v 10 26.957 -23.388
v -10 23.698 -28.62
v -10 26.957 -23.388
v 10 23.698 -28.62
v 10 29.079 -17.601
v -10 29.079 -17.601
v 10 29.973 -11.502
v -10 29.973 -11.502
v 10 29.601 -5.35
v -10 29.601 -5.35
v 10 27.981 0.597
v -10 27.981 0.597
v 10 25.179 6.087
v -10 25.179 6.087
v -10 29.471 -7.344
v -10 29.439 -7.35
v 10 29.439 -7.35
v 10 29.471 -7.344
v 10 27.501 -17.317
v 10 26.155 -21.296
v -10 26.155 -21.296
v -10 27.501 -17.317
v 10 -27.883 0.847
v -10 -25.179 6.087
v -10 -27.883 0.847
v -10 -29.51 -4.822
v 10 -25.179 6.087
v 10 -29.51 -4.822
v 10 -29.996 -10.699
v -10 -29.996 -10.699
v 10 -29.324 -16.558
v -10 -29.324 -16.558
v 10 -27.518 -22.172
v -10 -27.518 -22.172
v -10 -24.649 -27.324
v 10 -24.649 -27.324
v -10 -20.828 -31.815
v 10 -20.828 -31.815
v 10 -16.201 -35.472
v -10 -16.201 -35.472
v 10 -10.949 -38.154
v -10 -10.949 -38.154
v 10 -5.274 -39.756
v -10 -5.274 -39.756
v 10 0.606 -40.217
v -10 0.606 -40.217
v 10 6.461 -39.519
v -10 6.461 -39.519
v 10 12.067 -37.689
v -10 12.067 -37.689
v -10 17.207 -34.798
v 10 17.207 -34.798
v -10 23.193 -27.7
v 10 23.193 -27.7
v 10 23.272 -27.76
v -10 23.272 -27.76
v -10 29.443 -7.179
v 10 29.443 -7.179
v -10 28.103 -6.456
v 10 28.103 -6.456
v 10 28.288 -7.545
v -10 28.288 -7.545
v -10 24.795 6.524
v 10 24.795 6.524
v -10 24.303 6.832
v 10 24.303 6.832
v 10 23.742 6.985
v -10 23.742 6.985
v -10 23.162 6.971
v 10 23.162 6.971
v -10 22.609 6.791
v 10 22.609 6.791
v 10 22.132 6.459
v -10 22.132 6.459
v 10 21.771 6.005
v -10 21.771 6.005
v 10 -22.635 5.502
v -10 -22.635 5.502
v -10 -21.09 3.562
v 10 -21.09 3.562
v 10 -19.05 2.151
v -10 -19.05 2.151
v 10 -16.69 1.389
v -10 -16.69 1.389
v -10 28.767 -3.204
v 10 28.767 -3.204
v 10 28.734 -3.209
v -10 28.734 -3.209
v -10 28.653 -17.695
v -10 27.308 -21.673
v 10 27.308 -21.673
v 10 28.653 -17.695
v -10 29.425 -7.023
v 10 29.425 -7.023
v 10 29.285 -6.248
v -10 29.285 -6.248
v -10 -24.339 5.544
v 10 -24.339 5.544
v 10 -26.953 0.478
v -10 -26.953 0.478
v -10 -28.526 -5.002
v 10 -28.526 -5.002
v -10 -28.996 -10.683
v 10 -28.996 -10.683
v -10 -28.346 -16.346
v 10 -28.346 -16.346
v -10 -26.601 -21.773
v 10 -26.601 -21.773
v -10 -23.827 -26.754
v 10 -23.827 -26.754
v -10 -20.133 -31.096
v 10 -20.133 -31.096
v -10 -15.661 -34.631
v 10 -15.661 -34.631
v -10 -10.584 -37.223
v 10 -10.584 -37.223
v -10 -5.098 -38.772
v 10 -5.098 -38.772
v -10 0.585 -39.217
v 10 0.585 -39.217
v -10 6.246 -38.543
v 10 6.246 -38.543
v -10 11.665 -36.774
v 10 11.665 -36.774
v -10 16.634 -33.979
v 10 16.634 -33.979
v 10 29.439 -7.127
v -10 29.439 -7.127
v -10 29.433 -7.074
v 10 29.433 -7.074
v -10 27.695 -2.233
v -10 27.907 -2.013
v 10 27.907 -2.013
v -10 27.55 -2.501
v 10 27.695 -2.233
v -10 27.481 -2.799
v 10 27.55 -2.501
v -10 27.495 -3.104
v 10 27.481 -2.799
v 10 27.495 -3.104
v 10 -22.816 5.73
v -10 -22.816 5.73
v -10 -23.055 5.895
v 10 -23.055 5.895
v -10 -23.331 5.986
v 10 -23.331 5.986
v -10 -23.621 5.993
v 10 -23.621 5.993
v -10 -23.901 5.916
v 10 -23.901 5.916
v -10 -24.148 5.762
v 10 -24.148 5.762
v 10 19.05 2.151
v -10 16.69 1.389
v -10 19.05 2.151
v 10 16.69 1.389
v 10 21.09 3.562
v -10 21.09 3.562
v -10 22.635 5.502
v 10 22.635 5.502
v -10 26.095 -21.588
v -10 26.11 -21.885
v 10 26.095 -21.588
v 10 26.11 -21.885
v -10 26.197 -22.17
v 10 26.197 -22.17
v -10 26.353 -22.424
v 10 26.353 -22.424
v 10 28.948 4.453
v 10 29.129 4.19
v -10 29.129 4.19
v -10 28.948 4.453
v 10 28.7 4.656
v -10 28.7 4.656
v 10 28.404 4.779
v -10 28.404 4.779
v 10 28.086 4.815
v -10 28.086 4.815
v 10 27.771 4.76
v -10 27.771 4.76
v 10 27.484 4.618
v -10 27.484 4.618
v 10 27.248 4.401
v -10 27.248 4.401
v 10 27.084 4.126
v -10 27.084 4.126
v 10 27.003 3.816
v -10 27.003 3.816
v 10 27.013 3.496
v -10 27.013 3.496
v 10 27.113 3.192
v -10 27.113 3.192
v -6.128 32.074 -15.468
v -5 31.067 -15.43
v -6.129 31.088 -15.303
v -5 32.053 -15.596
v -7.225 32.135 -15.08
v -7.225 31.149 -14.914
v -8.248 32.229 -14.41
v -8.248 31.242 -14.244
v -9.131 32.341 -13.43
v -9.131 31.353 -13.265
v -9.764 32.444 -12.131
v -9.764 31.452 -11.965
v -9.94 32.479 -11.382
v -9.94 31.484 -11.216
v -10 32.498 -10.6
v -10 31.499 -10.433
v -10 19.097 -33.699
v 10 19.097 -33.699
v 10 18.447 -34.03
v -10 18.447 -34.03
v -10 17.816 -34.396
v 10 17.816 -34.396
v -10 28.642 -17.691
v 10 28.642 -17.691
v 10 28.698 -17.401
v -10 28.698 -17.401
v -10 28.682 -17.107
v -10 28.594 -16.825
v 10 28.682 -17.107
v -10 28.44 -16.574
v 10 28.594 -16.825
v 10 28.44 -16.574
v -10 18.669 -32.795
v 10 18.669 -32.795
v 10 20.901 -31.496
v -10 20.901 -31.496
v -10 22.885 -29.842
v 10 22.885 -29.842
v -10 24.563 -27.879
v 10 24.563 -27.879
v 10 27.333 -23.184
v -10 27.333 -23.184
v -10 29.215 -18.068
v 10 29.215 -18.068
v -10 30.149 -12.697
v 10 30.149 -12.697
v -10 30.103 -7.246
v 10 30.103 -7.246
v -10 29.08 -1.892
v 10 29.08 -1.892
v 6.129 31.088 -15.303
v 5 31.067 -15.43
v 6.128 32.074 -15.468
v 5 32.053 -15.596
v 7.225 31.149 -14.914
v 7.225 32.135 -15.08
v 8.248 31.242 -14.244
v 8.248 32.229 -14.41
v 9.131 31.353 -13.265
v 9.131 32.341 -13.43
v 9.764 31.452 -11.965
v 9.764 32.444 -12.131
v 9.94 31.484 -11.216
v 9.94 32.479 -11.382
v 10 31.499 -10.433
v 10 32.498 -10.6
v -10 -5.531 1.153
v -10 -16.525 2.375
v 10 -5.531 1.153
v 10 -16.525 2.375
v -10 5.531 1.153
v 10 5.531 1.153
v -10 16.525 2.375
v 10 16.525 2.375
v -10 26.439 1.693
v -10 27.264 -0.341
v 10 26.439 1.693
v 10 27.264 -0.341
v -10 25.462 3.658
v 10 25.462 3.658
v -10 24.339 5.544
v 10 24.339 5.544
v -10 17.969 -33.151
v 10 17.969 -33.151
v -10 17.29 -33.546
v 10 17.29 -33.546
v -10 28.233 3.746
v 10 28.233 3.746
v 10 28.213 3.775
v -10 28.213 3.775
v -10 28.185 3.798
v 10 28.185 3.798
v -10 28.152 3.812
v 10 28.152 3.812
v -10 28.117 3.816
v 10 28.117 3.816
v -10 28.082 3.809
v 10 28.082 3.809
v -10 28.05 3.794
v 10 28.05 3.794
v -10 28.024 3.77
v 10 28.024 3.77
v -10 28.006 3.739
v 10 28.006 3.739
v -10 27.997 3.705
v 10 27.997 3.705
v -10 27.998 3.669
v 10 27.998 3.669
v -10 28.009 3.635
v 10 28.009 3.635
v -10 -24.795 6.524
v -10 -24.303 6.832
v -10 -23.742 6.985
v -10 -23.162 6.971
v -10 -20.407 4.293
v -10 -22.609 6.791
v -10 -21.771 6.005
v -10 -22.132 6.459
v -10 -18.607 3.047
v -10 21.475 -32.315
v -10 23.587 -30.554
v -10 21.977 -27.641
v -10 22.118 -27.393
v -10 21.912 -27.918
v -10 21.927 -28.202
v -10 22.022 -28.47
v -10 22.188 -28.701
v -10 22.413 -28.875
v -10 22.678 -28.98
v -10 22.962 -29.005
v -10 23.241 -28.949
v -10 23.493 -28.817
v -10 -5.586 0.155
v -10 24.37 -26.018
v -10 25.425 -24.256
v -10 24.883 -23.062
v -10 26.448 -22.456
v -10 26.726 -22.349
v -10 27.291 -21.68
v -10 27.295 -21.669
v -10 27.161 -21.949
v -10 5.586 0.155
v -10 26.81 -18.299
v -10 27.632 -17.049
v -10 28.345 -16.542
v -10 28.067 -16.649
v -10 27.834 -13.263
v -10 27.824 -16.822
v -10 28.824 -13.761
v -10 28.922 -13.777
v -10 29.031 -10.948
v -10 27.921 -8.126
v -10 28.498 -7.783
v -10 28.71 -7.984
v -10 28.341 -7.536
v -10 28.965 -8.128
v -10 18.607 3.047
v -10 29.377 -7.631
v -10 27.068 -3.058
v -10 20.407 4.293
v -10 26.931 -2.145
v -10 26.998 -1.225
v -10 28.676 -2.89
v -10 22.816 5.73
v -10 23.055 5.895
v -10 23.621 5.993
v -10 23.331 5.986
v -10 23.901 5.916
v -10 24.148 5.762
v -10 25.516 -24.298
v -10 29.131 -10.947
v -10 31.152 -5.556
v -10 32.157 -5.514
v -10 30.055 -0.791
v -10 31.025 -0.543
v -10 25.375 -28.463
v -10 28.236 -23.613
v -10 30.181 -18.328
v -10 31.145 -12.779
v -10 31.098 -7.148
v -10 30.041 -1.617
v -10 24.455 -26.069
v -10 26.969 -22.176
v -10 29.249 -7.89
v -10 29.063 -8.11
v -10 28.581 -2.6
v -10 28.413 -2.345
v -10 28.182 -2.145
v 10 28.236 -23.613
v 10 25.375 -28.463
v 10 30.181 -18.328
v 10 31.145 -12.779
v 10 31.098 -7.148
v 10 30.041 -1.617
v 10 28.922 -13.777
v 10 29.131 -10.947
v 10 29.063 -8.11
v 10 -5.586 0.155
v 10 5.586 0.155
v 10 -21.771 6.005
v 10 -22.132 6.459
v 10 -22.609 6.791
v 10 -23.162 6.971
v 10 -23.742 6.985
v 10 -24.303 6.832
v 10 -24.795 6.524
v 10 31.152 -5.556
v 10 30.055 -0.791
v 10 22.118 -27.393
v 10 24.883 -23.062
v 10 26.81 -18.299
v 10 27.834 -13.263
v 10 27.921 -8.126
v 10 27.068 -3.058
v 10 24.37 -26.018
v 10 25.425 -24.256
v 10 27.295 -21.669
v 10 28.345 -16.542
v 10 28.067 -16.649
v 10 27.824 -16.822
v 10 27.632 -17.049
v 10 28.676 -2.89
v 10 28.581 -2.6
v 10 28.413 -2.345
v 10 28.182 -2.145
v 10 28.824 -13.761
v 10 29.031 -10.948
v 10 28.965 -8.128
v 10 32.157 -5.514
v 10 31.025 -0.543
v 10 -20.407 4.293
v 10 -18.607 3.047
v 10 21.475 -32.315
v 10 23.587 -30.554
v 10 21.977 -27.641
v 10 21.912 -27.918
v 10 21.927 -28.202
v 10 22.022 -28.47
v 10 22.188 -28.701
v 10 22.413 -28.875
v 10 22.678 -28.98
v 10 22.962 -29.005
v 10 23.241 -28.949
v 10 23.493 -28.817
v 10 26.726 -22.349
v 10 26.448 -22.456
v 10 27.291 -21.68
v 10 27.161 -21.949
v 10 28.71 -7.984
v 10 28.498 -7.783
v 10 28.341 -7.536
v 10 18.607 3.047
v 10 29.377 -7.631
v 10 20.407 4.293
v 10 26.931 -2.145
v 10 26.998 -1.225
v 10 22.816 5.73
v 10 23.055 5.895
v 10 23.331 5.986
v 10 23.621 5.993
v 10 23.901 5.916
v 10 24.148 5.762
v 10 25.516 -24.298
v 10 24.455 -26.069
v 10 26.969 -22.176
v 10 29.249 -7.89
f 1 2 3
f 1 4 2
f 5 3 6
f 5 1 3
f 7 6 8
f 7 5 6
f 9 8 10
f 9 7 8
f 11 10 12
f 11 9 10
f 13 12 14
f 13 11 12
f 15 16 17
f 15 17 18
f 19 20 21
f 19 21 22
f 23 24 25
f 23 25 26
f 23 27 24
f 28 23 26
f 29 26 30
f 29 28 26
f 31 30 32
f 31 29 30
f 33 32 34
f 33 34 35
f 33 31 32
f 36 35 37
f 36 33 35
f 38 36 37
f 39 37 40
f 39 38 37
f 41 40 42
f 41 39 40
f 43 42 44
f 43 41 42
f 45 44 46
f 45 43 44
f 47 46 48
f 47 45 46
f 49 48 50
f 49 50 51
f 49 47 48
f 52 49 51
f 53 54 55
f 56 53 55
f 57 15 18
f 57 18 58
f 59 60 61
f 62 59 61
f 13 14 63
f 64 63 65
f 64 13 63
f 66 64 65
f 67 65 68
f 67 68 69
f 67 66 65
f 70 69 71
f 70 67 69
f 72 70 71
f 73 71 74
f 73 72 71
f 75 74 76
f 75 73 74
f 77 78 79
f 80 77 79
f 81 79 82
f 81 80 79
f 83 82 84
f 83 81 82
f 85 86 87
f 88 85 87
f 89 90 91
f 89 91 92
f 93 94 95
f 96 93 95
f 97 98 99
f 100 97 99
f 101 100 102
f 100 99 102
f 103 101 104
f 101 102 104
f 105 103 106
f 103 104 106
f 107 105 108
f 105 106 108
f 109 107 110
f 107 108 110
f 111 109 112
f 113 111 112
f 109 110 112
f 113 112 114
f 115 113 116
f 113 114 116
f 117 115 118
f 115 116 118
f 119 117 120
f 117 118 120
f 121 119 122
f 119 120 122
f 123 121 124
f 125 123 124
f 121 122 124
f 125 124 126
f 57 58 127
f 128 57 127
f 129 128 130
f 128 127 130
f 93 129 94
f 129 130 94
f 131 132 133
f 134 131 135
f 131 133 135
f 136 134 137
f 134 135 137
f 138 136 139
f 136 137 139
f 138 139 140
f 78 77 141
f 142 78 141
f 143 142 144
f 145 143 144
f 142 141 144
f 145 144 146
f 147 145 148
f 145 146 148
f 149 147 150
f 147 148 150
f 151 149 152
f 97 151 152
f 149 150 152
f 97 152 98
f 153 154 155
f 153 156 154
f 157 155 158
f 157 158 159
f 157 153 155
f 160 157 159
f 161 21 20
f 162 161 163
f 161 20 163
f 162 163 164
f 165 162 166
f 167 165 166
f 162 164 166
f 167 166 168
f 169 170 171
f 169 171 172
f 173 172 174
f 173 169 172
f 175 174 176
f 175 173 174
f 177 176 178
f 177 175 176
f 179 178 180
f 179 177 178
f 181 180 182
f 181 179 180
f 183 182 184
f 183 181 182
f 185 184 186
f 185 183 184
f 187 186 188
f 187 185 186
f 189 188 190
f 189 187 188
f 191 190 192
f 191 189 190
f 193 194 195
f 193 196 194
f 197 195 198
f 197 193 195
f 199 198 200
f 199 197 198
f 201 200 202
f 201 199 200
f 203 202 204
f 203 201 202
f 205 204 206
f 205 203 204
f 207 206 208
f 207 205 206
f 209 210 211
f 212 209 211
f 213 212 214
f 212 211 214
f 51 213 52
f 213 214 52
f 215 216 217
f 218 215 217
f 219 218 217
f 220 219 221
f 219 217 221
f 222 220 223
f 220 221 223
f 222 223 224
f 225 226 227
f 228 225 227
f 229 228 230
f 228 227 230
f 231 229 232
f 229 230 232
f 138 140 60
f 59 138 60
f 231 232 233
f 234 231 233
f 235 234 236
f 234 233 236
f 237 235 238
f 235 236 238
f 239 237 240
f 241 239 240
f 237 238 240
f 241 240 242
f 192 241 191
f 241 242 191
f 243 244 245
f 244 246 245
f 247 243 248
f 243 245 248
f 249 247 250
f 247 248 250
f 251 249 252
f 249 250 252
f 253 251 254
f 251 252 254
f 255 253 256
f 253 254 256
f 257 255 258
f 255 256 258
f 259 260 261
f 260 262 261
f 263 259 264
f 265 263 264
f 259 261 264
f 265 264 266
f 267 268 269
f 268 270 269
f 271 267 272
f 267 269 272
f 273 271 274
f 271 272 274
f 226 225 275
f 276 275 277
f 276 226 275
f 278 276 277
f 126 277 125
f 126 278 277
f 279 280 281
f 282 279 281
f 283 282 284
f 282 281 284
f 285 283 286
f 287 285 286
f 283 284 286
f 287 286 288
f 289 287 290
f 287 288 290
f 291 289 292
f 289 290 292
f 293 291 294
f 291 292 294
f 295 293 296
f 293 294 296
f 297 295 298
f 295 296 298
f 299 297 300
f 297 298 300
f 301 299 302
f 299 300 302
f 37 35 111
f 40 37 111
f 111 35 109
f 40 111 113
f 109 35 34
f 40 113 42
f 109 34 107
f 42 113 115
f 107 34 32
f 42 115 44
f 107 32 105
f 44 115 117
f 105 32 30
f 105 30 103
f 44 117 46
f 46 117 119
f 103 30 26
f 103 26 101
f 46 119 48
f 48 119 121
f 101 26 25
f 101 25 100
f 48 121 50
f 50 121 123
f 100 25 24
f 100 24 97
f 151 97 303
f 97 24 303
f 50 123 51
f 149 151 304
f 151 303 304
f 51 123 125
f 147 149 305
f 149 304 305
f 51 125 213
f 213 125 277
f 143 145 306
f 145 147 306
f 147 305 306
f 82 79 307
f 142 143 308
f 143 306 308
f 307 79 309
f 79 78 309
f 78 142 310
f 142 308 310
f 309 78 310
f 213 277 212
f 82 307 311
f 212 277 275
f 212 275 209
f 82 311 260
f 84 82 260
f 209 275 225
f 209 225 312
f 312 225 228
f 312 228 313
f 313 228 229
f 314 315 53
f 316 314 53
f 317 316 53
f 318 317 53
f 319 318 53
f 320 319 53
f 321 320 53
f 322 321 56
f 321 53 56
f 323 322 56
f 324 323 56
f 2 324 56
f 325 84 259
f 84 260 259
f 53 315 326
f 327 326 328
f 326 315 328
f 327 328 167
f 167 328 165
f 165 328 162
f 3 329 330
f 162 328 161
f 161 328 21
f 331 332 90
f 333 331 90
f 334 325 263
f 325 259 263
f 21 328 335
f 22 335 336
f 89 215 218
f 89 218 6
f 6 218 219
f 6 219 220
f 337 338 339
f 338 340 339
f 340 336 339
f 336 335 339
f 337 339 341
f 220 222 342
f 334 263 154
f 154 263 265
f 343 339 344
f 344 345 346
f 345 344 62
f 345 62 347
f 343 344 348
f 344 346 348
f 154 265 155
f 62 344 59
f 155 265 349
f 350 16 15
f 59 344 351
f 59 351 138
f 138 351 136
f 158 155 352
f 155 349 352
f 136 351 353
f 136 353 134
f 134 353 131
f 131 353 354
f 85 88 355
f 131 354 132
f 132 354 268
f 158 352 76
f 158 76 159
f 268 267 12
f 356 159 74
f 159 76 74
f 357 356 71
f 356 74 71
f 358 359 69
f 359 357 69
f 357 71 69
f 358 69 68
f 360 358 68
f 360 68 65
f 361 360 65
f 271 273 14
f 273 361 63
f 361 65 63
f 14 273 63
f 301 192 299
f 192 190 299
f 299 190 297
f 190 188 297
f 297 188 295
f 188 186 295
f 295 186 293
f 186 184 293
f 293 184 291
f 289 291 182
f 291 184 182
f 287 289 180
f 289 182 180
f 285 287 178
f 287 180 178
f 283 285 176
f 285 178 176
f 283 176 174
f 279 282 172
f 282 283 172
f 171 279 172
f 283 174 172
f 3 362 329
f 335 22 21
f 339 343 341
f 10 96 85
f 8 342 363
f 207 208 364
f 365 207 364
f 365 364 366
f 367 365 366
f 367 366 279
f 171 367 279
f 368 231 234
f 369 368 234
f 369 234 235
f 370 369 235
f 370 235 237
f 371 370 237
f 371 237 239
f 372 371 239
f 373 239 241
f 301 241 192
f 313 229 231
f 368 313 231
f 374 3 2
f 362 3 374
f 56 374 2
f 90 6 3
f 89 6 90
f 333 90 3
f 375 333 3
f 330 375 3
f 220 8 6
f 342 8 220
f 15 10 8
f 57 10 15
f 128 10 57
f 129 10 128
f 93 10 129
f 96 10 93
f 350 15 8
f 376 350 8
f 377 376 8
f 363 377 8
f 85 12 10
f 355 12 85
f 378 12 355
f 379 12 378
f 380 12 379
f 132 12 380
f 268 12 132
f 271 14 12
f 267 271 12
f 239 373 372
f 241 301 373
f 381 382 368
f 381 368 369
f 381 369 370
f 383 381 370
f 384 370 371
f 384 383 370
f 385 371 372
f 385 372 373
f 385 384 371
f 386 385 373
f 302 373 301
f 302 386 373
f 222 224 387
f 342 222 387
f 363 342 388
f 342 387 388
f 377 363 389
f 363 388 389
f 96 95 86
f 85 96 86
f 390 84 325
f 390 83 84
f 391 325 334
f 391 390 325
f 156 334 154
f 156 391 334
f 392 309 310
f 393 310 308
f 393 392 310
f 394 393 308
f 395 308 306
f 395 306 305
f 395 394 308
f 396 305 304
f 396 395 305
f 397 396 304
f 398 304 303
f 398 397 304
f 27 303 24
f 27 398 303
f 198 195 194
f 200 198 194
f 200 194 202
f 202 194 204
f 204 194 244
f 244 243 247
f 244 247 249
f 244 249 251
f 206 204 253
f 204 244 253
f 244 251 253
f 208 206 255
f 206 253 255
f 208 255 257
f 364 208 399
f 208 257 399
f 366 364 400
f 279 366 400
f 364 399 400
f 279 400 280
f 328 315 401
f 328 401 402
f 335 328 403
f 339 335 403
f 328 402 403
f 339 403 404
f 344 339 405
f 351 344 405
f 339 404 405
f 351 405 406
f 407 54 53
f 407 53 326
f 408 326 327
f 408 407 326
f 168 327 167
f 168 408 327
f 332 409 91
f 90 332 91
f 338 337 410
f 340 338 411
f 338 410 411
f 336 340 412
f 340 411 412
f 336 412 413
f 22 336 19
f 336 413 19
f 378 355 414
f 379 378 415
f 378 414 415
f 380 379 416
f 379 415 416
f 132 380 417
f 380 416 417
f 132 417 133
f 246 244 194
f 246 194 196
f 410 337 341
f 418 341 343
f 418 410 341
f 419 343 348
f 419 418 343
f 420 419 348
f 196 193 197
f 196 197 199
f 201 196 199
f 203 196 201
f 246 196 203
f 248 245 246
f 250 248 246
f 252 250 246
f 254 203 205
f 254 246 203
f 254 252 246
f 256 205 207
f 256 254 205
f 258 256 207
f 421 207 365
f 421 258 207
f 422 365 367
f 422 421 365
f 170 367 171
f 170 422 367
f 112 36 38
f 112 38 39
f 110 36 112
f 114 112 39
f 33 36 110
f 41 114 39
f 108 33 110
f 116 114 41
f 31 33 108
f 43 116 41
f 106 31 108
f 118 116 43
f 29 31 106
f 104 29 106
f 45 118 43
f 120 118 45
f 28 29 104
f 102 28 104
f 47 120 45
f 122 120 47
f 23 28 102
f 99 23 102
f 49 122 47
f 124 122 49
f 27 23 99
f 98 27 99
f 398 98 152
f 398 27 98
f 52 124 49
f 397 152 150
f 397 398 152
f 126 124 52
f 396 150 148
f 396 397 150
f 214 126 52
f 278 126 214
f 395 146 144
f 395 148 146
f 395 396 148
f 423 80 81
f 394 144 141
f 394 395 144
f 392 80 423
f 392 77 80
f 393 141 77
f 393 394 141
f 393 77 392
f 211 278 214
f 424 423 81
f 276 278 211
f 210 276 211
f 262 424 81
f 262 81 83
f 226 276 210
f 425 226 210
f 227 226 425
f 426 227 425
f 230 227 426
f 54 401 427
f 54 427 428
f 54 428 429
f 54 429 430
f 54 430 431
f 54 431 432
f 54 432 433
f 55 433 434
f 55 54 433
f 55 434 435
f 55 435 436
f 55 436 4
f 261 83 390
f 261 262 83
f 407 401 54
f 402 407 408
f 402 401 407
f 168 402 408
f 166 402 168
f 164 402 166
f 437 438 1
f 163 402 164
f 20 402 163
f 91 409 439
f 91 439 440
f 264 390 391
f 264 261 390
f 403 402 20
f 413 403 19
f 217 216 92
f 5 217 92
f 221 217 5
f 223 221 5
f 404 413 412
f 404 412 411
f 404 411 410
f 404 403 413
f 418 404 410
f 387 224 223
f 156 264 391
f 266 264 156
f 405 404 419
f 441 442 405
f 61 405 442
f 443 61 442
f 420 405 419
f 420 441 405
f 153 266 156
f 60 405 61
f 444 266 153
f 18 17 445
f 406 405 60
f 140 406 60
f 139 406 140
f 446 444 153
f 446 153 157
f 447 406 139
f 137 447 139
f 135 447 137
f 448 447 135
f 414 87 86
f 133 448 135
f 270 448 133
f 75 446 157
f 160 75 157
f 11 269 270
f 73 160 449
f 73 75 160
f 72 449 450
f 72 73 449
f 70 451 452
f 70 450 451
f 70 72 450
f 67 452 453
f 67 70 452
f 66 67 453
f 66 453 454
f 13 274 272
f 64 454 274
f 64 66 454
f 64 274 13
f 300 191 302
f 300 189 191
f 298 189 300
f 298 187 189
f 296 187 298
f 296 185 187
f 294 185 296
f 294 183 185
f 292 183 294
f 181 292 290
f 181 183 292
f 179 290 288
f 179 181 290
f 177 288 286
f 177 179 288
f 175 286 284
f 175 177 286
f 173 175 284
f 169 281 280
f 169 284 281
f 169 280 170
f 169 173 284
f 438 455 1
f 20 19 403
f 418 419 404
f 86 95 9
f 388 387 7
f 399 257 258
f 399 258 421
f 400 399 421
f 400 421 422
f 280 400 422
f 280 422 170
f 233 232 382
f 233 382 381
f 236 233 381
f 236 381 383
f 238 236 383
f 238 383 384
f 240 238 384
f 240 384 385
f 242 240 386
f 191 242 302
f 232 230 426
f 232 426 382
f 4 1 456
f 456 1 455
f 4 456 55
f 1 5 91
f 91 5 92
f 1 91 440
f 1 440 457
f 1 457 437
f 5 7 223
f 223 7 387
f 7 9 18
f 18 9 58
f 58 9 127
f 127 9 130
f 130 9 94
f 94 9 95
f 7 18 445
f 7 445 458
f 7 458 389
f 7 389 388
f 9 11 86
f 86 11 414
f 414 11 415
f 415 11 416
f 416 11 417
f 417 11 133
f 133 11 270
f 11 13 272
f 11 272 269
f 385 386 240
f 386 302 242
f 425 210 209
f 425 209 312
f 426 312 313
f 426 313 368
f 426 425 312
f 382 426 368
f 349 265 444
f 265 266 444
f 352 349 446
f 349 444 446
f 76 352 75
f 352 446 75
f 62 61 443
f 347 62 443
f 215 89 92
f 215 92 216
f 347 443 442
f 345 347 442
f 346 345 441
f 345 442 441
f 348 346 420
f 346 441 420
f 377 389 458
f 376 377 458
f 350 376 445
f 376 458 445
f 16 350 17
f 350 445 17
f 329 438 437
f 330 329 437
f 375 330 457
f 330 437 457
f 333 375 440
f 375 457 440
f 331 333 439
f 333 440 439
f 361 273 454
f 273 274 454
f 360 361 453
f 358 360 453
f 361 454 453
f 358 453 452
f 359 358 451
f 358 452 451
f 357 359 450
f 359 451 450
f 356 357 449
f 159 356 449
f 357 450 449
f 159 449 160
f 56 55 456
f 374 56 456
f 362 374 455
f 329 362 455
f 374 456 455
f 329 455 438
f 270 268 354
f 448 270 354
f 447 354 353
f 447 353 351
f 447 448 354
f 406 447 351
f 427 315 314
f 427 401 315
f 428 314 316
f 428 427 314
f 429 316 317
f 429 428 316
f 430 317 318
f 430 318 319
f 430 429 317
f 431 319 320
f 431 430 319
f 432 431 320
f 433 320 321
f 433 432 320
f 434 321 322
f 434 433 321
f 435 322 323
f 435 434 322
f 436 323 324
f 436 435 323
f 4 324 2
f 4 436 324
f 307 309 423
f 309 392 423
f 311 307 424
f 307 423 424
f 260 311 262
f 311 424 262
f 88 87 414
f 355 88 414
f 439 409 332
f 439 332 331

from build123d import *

# Parameters (mm, degrees)
PAD_DEPTH            = 10
POCKET004_DEPTH      = 10.001
POCKET004_DEPTH_BACK = 10.001
FILLET_R             = 5


with BuildPart() as part:
    # Sketch031 → Pad (new body, symmetric)
    with BuildSketch(Plane.YZ):
        with BuildLine():
            ThreePointArc((-25.1785714286, 6.0873812391), (-20.8275502166, -31.8153069654), (17.2072930905, -34.7978986763))
            ThreePointArc((19.0972829456, -33.698609943), (18.1291736499, -34.2085141395), (17.2072930905, -34.7978986763))
            ThreePointArc((19.0972829456, -33.698609943), (22.5681914002, -31.4789887478), (25.3748102311, -28.4628961617))
            ThreePointArc((25.3748102311, -28.4628961617), (31.145297274, -12.7793024717), (28.0089705885, 3.6352364091))
            ThreePointArc((28.2330423532, 3.7461049992), (28.0655721758, 3.8027065865), (28.0089705885, 3.6352364091))
            ThreePointArc((31.066665528, -15.4302839547), (31.1616320501, -5.6186996886), (28.2330423532, 3.7461049992))
            Line((31.066665528, -15.4302839547), (32.0529088781, -15.595583847))
            ThreePointArc((32.0529088781, -15.595583847), (32.1508902105, -5.4725207152), (29.129329412, 4.1895793594))
            ThreePointArc((29.129329412, 4.1895793594), (27.6220978156, 4.6989936454), (27.1126835297, 3.1917620489))
            ThreePointArc((24.5628424703, -27.8791938768), (30.1486495946, -12.6974892471), (27.1126835297, 3.1917620489))
            ThreePointArc((18.6688560963, -32.7950334743), (21.9277036404, -30.7110203695), (24.5628424703, -27.8791938768))
            ThreePointArc((18.6688560963, -32.7950334743), (17.6263968436, -33.3440978723), (16.6337166542, -33.978746632))
            ThreePointArc((-24.3392857143, 5.5436906196), (-20.1332985427, -31.0955746448), (16.6337166542, -33.978746632))
            ThreePointArc((-22.6352951412, 5.5022803073), (-23.4757052121, 5.9997048381), (-24.3392857143, 5.5436906196))
            ThreePointArc((-22.6352951412, 5.5022803073), (-20.1217753495, 2.7817742688), (-16.6898993292, 1.3885184309))
            ThreePointArc((-16.6898993292, 1.3885184309), (0, 0), (16.6898993292, 1.3885184309))
            ThreePointArc((16.6898993292, 1.3885184309), (20.1217753495, 2.7817742688), (22.6352951412, 5.5022803073))
            ThreePointArc((24.3392857143, 5.5436906196), (23.4757052121, 5.9997048381), (22.6352951412, 5.5022803073))
            ThreePointArc((27.2641709757, -0.3407779116), (25.9689416046, 2.6845699939), (24.3392857143, 5.5436906196))
            ThreePointArc((27.2641709757, -0.3407779116), (26.9390804209, -1.6832404813), (27.0677858666, -3.0584948317))
            ThreePointArc((22.1178198442, -27.393137735), (27.4381060497, -15.80458599), (27.0677858666, -3.0584948317))
            ThreePointArc((22.1178198442, -27.393137735), (22.2945348248, -28.7962670289), (23.6976641188, -28.6195520483))
            ThreePointArc((23.6976641188, -28.6195520483), (29.9727276849, -11.5022412242), (25.1785714286, 6.0873812391))
            ThreePointArc((25.1785714286, 6.0873812391), (23.4514104243, 6.9994096762), (21.7705902823, 6.0045606146))
            ThreePointArc((16.5246528012, 2.3747707237), (19.5527787015, 3.6041141101), (21.7705902823, 6.0045606146))
            ThreePointArc((-16.5246528012, 2.3747707237), (0, 1), (16.5246528012, 2.3747707237))
            ThreePointArc((-21.7705902823, 6.0045606146), (-19.5527787015, 3.6041141101), (-16.5246528012, 2.3747707237))
            ThreePointArc((-21.7705902823, 6.0045606146), (-23.4514104243, 6.9994096762), (-25.1785714286, 6.0873812391))
        make_face()
        Polygon((27.5840933648, -3.4048594066), (28.2878580479, -7.5454771468), (29.4708916879, -7.3444015231), (28.7671270049, -3.2037837828), align=None, mode=Mode.SUBTRACT)
        Polygon((27.5163556374, -17.3102281064), (26.1710903804, -21.2889542076), (27.3078692665, -21.6733157096), (28.6531345235, -17.6945896084), align=None, mode=Mode.SUBTRACT)
    extrude(amount=PAD_DEPTH, both=True)

    # Sketch039 → Pocket004 (cut, two sides)
    with BuildSketch(Plane.YZ) as pocket004_sk:
        with BuildLine():
            Line((27.4949433361, -3.1040168152), (28.2442255017, -7.2366402237))
            ThreePointArc((28.2442255017, -7.2366402237), (28.4905833373, -7.7742998522), (28.964758919, -8.1277508063))
            ThreePointArc((28.3448300239, -16.5415137543), (28.9619594976, -12.3572643032), (28.964758919, -8.1277508063))
            ThreePointArc((28.3448300239, -16.5415137543), (27.8239715042, -16.8216502598), (27.501471991, -17.3173962868))
            Line((26.1545833247, -21.2955731206), (27.501471991, -17.3173962868))
            ThreePointArc((26.1545833247, -21.2955731206), (26.1095843724, -21.8852723266), (26.3531287482, -22.4242122085))
            ThreePointArc((23.1927484305, -27.7003268604), (24.9130052946, -25.1461691628), (26.3531287482, -22.4242122085))
            Line((23.1927484305, -27.7003268604), (23.2721556366, -27.7601644822))
            ThreePointArc((23.2721556366, -27.7601644822), (25.001049311, -25.1926749171), (26.4478472443, -22.4562809862))
            ThreePointArc((26.4478472443, -22.4562809862), (26.968705764, -22.1761444807), (27.2912052772, -21.6803984538))
            Line((28.6380939435, -17.70222162), (27.2912052772, -21.6803984538))
            ThreePointArc((28.6380939435, -17.70222162), (28.6830928958, -17.112522414), (28.43954852, -16.5735825321))
            ThreePointArc((28.43954852, -16.5735825321), (29.0611192972, -12.3645704307), (29.0631547145, -8.1099107548))
            ThreePointArc((29.0631547145, -8.1099107548), (29.3830587907, -7.6124859451), (29.424975047, -7.022559605))
            Line((29.424975047, -7.022559605), (28.6756928814, -2.8899361965))
            ThreePointArc((28.6756928814, -2.8899361965), (28.4127513004, -2.3450081602), (27.9069175932, -2.0130185515))
            ThreePointArc((27.9069175932, -2.0130185515), (27.5498359522, -2.5014625518), (27.4949433361, -3.1040168152))
        make_face()
    extrude(amount=-POCKET004_DEPTH, mode=Mode.SUBTRACT)
    extrude(pocket004_sk.sketch, amount=POCKET004_DEPTH_BACK, mode=Mode.SUBTRACT)

    # Fillet
    fillet_edges = [part.edges().sort_by_distance(p)[0] for p in [
        (10, 31.559787, -15.512934),
        (-10, 31.559787, -15.512934),
    ]]
    fillet(fillet_edges, radius=FILLET_R)


solid = part.part
